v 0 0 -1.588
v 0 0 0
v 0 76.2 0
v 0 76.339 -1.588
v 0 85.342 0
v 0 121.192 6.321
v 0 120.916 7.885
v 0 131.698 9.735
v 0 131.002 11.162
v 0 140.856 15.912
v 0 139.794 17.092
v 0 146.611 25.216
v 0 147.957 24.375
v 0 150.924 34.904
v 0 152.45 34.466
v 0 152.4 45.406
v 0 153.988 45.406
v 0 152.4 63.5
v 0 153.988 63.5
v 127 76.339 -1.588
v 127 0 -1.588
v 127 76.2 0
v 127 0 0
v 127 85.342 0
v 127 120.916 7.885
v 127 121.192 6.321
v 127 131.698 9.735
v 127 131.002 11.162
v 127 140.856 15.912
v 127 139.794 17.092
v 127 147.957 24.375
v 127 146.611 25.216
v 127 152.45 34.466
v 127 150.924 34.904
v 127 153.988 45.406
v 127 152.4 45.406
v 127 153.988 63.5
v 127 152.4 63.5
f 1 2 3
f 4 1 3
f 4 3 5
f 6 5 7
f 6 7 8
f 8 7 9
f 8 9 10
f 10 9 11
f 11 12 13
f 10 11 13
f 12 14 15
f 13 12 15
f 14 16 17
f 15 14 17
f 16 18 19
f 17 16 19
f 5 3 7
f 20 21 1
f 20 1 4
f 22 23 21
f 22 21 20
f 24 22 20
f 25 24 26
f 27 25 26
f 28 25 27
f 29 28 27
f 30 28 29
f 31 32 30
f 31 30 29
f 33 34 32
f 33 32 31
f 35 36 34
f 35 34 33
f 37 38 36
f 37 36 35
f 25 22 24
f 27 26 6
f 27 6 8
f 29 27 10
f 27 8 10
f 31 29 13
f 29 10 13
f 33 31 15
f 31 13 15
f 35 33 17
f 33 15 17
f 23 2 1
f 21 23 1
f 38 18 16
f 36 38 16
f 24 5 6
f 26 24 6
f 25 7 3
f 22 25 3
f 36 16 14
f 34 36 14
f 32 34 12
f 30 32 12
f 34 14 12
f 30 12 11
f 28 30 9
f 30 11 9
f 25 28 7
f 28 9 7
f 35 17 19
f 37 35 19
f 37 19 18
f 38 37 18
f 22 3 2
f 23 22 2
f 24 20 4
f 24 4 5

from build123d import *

# Parameters (mm, degrees)
F1_DEPTH = 127


with BuildPart() as f1:
    # F0 (on Right) → F1 (new body)
    with BuildSketch(Plane.YZ):
        with BuildLine():
            Line((120.915996, 7.884636), (76.2, 0))
            Line((76.2, 0), (85.342048, 0))
            Line((85.342048, 0), (121.191662, 6.321254))
            ThreePointArc((121.191662, 6.321254), (144.702389, 19.895179), (153.9875, 45.405812))
            Line((153.9875, 45.405812), (153.9875, 63.5))
            Line((153.9875, 63.5), (152.4, 63.5))
            Line((152.4, 63.5), (152.4, 45.405812))
            ThreePointArc((152.4, 45.405812), (143.486293, 20.915604), (120.915996, 7.884636))
        make_face()
        Polygon((76.2, 0), (0, 0), (0, -1.5875), (76.338888, -1.5875), (85.342048, 0), align=None)
    extrude(amount=F1_DEPTH)


solid = f1.part
